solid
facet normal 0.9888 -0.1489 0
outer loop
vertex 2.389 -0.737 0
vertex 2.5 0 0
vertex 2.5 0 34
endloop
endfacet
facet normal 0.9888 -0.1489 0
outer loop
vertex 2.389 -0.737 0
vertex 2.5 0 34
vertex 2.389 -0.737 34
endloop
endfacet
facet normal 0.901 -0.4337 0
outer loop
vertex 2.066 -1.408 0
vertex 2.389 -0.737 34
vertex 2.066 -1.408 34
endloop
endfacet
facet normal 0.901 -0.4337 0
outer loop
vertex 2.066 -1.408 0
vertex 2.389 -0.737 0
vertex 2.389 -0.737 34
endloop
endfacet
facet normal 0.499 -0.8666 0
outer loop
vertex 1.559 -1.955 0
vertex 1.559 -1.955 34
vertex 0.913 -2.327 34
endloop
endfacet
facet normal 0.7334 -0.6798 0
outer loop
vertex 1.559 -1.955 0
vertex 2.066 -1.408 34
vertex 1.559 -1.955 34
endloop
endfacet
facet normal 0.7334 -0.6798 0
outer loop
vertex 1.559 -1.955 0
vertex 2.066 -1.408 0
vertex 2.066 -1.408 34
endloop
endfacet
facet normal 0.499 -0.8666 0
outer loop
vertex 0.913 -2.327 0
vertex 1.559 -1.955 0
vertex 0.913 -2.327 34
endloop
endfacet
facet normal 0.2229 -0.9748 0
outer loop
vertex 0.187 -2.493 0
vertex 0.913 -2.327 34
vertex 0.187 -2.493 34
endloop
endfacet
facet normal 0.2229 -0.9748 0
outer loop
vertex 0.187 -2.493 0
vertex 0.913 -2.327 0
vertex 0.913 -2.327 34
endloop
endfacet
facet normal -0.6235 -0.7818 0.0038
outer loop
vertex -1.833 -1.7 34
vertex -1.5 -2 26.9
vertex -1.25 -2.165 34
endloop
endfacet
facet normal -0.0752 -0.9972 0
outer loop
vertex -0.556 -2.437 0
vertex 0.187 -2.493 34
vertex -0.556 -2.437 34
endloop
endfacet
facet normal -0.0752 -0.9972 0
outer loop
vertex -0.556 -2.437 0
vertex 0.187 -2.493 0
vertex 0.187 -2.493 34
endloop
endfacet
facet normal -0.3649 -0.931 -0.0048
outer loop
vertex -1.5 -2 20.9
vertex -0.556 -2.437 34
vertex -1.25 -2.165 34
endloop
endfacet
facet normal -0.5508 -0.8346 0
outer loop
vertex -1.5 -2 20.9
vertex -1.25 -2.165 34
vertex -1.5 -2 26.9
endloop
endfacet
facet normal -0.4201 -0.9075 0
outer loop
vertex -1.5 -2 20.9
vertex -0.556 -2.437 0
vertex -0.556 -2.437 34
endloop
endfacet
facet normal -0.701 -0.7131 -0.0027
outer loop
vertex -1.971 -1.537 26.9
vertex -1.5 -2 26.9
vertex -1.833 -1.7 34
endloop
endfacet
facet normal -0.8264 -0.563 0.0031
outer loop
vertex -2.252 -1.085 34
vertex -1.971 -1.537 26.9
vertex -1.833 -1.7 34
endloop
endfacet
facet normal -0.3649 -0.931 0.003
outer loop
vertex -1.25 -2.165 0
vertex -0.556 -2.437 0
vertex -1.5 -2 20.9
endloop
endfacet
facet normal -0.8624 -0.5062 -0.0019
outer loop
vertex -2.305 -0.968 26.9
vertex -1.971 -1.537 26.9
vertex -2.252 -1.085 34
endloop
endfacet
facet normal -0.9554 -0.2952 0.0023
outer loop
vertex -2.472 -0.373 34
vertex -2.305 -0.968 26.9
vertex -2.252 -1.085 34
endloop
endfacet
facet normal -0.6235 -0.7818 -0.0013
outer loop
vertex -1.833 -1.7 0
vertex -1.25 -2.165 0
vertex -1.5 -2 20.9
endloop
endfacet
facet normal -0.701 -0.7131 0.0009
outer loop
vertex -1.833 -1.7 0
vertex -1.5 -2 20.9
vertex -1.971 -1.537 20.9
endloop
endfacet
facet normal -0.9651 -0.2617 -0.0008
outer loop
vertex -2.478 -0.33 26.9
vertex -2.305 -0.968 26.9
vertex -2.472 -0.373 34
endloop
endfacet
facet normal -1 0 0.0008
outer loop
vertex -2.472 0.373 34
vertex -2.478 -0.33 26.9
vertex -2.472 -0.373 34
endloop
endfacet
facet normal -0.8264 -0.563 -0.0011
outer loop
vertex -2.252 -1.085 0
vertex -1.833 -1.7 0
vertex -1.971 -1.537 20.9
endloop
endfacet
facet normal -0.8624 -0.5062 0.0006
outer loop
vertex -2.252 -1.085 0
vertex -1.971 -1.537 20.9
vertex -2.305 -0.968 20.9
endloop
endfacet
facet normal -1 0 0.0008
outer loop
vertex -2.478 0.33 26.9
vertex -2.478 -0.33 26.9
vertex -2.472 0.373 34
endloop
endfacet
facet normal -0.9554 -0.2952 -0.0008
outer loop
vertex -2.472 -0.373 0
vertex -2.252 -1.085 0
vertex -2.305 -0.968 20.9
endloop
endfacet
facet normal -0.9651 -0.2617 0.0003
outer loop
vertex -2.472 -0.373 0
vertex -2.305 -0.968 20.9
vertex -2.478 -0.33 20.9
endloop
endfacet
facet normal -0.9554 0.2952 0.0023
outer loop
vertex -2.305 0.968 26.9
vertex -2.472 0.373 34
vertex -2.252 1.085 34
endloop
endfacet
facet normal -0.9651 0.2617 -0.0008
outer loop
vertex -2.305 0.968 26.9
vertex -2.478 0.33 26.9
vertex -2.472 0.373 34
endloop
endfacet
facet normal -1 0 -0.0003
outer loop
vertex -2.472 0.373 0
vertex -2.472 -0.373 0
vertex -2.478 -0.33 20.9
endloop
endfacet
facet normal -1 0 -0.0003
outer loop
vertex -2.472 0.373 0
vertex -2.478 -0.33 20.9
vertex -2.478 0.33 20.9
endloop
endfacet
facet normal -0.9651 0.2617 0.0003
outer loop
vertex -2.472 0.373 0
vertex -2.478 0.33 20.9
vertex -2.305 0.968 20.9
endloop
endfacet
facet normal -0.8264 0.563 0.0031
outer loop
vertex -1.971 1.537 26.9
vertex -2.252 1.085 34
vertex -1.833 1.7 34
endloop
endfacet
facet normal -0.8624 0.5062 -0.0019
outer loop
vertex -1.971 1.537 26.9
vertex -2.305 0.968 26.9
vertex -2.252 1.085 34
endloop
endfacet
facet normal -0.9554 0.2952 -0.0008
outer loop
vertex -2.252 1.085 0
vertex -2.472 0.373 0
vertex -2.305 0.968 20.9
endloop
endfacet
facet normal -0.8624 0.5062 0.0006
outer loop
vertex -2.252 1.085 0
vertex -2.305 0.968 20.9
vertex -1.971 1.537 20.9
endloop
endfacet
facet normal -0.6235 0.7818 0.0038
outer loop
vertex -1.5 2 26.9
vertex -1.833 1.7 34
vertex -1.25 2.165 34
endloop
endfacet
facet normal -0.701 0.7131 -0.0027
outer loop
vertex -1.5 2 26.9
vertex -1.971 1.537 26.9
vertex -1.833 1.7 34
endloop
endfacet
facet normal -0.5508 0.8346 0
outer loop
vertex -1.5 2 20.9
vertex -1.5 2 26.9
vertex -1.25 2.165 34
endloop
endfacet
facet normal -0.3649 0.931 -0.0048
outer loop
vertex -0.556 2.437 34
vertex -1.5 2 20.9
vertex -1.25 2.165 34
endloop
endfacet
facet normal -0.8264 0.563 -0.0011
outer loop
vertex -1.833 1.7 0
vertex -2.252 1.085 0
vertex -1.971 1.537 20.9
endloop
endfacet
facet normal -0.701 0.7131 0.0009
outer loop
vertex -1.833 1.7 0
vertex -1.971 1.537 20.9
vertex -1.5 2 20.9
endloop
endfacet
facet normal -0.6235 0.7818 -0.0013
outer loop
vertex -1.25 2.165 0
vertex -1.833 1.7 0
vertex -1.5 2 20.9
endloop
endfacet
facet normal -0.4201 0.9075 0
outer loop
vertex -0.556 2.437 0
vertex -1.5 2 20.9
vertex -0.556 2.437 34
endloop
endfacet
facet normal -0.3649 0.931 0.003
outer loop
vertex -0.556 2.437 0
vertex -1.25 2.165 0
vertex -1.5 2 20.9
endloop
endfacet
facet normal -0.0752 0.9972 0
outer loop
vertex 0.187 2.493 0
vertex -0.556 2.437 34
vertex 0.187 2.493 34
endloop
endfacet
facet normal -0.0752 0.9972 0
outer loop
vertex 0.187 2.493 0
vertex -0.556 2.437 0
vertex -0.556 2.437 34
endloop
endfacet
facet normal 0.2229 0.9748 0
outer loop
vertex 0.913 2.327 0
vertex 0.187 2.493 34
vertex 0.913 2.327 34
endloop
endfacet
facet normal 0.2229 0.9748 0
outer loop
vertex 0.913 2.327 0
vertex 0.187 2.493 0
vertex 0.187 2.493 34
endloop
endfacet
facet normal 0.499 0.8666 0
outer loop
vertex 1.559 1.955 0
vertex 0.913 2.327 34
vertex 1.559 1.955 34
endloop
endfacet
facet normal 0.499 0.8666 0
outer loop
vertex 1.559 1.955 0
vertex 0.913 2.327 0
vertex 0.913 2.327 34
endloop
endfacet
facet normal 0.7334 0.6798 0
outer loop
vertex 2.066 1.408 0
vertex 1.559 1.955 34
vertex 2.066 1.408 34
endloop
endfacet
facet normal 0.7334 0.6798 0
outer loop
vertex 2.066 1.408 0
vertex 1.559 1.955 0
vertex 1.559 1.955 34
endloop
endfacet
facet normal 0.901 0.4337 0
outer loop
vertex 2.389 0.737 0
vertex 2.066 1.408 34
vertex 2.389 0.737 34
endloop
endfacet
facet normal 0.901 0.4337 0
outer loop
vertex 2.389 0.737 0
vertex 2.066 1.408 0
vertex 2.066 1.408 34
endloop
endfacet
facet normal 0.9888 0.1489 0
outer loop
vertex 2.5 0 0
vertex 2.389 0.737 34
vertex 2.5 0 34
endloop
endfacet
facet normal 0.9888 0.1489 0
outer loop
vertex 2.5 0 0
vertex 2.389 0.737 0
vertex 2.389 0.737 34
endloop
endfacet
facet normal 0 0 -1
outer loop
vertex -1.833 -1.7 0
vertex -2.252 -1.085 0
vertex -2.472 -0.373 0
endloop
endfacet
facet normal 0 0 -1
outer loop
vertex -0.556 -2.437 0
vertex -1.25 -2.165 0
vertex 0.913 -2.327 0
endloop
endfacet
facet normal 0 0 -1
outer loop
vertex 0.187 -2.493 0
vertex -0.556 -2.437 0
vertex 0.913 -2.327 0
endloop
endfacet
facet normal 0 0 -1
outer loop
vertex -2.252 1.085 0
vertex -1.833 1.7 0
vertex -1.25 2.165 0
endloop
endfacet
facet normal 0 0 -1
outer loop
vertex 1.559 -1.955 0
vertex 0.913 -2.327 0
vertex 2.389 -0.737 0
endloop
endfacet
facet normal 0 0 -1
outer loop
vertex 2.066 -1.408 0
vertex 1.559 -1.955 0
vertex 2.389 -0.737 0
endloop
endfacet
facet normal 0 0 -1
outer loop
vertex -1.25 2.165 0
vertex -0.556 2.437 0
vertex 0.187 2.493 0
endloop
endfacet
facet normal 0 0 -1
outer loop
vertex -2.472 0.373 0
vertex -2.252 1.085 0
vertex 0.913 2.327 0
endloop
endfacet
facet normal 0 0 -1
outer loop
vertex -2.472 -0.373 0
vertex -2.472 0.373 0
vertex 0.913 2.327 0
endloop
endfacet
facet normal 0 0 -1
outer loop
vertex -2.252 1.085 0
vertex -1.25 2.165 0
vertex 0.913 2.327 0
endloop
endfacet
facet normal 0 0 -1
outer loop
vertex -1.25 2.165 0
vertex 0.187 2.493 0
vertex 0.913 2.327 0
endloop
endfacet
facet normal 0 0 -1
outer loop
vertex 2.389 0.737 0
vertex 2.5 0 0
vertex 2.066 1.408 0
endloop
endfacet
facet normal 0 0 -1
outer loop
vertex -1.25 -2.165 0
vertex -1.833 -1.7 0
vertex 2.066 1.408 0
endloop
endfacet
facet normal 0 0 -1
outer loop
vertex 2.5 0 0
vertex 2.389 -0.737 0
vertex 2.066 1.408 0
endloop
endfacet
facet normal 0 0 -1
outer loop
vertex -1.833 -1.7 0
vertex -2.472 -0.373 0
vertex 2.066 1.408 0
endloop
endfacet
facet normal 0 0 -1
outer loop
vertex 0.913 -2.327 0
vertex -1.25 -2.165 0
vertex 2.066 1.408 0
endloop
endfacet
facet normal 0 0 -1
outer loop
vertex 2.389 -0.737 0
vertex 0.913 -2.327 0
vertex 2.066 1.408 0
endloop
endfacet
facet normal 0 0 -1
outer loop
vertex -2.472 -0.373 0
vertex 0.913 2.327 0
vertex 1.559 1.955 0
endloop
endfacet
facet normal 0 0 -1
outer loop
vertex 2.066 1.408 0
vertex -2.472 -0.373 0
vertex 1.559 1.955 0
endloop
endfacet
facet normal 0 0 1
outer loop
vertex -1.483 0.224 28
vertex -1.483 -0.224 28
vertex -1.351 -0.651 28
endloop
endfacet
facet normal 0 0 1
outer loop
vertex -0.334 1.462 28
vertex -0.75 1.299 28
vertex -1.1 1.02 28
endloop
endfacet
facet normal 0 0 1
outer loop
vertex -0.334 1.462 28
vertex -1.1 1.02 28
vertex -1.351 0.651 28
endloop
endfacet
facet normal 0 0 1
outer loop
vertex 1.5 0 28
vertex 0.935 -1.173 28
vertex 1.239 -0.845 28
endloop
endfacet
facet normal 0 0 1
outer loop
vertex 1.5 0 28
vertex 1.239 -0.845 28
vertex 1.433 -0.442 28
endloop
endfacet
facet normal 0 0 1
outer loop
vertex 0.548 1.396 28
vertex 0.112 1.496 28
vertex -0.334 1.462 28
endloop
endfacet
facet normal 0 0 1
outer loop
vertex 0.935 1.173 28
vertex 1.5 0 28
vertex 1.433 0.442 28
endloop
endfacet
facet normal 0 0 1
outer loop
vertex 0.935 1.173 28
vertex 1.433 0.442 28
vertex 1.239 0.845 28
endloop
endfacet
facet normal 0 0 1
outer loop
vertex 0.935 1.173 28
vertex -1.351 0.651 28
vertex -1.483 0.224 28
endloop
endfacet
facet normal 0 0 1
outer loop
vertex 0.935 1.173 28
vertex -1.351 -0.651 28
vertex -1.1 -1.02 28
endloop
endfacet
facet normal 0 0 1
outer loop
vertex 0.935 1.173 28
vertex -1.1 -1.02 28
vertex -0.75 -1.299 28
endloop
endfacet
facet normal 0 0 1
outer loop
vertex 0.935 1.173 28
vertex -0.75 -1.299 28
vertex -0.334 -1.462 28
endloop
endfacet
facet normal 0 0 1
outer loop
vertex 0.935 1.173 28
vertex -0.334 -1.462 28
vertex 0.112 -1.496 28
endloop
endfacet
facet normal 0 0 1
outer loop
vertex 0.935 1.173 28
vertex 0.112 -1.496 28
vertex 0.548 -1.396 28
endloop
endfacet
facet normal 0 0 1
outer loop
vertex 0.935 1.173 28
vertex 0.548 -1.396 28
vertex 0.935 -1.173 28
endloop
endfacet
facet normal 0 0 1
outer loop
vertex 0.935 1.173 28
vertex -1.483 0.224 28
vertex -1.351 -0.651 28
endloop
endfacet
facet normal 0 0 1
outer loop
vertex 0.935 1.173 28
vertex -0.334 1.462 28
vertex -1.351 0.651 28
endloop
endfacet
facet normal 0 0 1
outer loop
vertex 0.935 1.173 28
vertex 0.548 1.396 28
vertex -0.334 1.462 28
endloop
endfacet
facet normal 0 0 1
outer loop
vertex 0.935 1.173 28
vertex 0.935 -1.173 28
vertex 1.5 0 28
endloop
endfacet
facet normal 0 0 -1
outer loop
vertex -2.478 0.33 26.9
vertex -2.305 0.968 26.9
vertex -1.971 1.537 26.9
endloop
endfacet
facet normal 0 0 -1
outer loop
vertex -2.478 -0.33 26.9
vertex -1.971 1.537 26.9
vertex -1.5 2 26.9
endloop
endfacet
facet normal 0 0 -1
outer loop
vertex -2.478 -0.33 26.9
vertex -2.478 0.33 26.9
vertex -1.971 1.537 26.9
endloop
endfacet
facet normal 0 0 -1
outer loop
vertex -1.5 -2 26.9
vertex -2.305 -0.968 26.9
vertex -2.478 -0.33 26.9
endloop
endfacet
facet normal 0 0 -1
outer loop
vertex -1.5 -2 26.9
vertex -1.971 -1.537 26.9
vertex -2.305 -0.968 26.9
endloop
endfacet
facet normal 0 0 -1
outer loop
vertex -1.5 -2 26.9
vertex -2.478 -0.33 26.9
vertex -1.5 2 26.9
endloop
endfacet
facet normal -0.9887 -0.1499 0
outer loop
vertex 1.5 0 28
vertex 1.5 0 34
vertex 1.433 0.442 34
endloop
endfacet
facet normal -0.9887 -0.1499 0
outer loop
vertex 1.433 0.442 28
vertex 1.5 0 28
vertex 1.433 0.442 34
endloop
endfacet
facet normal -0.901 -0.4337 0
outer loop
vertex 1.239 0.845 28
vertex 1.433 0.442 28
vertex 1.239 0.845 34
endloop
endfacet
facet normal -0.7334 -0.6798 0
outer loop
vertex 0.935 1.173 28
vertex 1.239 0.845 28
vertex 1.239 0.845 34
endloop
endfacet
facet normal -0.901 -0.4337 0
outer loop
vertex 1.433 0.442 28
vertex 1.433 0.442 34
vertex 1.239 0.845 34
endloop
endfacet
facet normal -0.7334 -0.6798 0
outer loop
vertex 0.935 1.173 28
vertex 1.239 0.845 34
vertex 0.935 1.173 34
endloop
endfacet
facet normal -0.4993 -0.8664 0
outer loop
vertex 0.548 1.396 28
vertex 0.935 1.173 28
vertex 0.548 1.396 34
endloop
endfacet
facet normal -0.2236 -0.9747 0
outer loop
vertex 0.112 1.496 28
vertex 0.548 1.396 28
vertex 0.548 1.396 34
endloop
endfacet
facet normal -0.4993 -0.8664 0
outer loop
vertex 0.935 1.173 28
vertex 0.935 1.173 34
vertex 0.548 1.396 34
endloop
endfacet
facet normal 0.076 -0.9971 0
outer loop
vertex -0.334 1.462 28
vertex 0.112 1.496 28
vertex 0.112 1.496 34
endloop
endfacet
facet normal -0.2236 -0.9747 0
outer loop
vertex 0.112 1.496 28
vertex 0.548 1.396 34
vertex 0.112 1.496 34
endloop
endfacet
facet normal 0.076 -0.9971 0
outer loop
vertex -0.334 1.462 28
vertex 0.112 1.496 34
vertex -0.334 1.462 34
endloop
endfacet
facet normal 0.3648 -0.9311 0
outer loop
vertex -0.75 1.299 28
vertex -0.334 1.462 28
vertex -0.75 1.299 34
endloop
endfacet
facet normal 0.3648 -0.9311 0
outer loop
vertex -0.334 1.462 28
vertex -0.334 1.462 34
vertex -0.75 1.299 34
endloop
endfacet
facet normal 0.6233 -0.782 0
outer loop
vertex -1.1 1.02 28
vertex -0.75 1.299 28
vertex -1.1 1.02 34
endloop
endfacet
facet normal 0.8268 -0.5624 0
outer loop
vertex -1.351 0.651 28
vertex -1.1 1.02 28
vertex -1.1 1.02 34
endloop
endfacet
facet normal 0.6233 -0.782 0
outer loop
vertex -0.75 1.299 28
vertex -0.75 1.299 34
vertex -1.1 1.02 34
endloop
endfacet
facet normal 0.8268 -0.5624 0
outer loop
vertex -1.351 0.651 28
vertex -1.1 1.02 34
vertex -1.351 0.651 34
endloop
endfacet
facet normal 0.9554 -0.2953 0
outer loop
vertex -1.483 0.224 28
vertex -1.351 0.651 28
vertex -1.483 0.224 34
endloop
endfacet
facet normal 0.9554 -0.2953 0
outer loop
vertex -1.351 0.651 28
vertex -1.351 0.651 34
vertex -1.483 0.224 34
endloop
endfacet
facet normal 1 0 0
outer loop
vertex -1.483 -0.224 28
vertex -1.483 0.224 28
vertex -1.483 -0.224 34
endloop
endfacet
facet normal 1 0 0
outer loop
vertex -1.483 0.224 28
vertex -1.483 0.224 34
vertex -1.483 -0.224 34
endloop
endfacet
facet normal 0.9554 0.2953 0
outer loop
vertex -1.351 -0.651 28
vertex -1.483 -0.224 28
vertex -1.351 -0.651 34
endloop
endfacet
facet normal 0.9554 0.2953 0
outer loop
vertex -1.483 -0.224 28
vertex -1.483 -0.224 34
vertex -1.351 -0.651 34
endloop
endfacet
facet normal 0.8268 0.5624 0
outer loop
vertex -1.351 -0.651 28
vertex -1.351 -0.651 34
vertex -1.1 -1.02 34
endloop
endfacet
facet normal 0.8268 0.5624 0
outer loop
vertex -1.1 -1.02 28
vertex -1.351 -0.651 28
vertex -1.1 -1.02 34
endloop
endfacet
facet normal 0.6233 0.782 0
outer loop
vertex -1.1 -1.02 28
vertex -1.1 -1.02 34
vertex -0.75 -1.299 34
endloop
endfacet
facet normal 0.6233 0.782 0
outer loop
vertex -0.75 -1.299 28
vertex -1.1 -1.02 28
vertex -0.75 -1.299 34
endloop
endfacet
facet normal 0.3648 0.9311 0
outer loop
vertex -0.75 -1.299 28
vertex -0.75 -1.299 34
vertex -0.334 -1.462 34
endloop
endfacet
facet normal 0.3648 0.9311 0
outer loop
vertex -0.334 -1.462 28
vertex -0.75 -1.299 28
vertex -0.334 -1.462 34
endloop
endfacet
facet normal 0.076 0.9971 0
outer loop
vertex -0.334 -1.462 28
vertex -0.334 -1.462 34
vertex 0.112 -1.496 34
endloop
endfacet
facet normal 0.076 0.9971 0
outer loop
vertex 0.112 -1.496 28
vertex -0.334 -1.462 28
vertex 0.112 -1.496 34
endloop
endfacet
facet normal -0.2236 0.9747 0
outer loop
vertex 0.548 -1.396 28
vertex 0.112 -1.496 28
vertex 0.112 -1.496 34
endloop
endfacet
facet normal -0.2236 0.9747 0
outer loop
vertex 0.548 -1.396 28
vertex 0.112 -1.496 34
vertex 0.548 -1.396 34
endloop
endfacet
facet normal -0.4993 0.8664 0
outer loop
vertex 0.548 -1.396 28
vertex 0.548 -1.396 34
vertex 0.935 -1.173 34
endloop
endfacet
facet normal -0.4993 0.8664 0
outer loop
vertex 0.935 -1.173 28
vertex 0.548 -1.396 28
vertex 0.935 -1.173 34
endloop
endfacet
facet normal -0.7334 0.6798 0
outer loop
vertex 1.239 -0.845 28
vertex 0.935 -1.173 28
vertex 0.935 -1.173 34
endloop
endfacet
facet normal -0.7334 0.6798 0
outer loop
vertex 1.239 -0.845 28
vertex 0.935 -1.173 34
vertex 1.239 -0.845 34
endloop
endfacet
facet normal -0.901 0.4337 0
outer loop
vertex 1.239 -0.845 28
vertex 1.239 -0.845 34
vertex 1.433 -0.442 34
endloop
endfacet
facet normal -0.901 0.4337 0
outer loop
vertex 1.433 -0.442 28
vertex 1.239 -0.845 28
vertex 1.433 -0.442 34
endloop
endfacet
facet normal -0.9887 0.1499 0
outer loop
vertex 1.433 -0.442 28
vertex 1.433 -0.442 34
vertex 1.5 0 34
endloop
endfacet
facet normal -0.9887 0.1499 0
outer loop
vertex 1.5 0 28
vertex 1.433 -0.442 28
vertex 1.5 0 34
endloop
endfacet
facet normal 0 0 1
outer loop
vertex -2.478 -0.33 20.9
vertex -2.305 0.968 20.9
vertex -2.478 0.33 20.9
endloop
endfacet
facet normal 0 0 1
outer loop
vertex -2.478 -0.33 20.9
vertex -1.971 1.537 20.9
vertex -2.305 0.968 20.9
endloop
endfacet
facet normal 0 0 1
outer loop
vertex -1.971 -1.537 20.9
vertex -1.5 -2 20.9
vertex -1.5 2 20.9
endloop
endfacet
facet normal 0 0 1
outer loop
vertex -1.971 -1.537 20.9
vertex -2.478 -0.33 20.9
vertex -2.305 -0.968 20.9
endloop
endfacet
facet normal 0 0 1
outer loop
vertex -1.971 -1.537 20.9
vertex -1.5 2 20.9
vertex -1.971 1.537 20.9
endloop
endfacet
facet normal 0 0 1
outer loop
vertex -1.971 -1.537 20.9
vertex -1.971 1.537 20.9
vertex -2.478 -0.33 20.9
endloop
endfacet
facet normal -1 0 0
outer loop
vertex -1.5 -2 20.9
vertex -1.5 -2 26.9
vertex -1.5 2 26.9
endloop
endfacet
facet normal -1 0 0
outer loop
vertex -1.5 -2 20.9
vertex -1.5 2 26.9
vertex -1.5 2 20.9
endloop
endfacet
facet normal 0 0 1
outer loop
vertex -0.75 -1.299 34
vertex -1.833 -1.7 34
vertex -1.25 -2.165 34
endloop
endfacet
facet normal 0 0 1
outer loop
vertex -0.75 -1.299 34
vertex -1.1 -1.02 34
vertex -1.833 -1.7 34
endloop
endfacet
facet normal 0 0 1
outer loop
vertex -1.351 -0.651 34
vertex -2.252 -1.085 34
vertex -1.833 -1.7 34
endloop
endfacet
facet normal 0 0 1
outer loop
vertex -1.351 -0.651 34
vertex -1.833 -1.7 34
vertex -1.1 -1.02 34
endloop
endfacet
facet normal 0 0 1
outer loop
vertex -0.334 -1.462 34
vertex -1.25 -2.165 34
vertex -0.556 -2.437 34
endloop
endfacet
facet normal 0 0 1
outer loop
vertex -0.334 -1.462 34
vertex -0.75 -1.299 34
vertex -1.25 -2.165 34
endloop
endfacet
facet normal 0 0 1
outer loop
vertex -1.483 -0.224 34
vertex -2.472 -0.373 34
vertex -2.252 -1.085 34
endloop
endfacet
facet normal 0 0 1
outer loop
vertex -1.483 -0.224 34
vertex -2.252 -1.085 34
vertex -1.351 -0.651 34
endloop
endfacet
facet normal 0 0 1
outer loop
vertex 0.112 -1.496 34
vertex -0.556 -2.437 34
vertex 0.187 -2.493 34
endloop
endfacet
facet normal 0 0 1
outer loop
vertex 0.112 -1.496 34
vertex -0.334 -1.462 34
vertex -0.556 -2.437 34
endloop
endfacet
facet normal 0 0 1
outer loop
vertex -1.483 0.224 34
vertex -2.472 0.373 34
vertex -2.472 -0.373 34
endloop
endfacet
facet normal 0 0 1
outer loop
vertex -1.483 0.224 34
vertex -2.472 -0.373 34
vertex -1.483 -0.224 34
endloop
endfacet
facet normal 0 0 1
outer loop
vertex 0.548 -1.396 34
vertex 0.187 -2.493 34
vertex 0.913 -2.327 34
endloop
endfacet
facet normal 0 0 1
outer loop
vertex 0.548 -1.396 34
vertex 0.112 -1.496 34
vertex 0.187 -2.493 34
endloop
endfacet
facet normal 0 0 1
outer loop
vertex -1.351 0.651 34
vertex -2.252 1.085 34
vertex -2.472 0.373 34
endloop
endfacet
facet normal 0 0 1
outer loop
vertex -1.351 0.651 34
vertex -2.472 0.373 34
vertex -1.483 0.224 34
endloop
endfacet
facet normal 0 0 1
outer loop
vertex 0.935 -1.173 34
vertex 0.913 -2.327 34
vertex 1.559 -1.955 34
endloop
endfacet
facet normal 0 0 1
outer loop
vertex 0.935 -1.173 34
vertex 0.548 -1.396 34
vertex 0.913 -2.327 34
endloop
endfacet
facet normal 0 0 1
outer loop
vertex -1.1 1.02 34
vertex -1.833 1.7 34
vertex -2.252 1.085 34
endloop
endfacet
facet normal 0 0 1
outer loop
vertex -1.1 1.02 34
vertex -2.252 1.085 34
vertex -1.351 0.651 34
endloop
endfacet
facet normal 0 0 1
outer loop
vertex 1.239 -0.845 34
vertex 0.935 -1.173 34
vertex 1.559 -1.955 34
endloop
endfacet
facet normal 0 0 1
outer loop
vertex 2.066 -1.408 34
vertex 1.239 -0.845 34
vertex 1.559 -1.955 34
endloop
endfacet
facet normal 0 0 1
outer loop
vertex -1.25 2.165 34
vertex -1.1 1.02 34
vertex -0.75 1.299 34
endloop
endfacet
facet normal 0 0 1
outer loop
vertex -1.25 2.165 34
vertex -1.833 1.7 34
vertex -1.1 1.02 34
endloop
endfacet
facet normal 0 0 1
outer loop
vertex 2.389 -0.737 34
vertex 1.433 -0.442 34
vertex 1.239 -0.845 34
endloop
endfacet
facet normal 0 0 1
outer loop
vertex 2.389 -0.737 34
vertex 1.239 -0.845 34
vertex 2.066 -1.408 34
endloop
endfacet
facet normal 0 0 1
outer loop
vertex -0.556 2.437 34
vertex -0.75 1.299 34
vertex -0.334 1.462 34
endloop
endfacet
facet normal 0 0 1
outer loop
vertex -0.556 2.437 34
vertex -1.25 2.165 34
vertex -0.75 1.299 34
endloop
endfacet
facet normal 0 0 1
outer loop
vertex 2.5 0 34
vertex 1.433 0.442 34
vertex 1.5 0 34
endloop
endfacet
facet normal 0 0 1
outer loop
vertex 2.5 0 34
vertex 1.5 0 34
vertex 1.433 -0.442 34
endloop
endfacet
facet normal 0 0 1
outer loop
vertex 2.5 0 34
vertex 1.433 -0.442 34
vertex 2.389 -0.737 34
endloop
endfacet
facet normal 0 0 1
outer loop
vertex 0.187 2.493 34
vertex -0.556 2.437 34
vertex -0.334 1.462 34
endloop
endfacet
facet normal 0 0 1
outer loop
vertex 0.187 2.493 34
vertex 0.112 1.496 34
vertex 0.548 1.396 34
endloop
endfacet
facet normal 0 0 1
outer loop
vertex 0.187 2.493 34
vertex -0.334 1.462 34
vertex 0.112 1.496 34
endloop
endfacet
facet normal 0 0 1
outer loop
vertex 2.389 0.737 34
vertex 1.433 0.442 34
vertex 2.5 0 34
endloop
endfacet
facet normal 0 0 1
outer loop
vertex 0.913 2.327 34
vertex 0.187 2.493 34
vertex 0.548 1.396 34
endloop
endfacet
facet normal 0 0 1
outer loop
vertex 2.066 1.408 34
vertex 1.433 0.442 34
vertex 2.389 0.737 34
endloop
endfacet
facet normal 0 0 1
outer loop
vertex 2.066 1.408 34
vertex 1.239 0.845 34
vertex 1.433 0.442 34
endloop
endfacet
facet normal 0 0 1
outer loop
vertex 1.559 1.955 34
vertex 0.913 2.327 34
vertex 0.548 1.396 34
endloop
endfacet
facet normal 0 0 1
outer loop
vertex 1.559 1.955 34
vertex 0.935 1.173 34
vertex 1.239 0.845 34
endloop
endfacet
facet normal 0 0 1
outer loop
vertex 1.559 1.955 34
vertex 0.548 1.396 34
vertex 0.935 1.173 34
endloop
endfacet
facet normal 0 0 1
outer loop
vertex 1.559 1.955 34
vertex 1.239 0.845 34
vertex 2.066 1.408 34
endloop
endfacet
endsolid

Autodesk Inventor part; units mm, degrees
ref_plane "YZ Plane" through (0, 0, 0) normal (1, 0, 0) x (0, 1, 0)
ref_plane "XZ Plane" through (0, 0, 0) normal (0, 1, 0) x (-1, 0, 0)
ref_plane "XY Plane" through (0, 0, 0) normal (0, 0, 1) x (1, 0, 0)
sketch "スケッチ1" plane through (0, 0, 0) normal (0, 0, 1) x (1, 0, 0)
  circle A0 centre (0, 0) radius 2.5
  dimension "d0" = 5
extrude "押し出し1" add sketch "スケッチ1" along normal blind 34
sketch "スケッチ2" plane through (0, 0, 34) normal (0, 0, 1) x (1, 0, 0)
  circle A0 centre (0, 0) radius 1.5
  dimension "d3" = 3
extrude "押し出し2" cut sketch "スケッチ2" against normal blind 6
sketch "スケッチ3" plane through (0, 0, 0) normal (0, 1, 0) x (-1, 0, 0)
  line L0 (2.5, 0) -> (2.5, 34) projected
  line L1 (2.5, 23.9) -> (2.5, 26.9)
  line L2 (2.5, 26.9) -> (1.5, 26.9)
  line L3 (1.5, 26.9) -> (1.5, 20.9)
  line L4 (1.5, 20.9) -> (2.5, 20.9)
  line L5 (2.5, 20.9) -> (2.5, 23.9)
  point P0 (0, 0)
  dimension "d8" = 3
  dimension "d9" = 1
  dimension "d10" = 6
extrude "押し出し3" cut sketch "スケッチ3" along normal mid plane 10
thread "ねじ2" size "M3x0.5" class "6H" standard "ANSI Metric M Profile" full length
properties part number "shaft_34mm_Φ5" material "アルミニウム 7075"
